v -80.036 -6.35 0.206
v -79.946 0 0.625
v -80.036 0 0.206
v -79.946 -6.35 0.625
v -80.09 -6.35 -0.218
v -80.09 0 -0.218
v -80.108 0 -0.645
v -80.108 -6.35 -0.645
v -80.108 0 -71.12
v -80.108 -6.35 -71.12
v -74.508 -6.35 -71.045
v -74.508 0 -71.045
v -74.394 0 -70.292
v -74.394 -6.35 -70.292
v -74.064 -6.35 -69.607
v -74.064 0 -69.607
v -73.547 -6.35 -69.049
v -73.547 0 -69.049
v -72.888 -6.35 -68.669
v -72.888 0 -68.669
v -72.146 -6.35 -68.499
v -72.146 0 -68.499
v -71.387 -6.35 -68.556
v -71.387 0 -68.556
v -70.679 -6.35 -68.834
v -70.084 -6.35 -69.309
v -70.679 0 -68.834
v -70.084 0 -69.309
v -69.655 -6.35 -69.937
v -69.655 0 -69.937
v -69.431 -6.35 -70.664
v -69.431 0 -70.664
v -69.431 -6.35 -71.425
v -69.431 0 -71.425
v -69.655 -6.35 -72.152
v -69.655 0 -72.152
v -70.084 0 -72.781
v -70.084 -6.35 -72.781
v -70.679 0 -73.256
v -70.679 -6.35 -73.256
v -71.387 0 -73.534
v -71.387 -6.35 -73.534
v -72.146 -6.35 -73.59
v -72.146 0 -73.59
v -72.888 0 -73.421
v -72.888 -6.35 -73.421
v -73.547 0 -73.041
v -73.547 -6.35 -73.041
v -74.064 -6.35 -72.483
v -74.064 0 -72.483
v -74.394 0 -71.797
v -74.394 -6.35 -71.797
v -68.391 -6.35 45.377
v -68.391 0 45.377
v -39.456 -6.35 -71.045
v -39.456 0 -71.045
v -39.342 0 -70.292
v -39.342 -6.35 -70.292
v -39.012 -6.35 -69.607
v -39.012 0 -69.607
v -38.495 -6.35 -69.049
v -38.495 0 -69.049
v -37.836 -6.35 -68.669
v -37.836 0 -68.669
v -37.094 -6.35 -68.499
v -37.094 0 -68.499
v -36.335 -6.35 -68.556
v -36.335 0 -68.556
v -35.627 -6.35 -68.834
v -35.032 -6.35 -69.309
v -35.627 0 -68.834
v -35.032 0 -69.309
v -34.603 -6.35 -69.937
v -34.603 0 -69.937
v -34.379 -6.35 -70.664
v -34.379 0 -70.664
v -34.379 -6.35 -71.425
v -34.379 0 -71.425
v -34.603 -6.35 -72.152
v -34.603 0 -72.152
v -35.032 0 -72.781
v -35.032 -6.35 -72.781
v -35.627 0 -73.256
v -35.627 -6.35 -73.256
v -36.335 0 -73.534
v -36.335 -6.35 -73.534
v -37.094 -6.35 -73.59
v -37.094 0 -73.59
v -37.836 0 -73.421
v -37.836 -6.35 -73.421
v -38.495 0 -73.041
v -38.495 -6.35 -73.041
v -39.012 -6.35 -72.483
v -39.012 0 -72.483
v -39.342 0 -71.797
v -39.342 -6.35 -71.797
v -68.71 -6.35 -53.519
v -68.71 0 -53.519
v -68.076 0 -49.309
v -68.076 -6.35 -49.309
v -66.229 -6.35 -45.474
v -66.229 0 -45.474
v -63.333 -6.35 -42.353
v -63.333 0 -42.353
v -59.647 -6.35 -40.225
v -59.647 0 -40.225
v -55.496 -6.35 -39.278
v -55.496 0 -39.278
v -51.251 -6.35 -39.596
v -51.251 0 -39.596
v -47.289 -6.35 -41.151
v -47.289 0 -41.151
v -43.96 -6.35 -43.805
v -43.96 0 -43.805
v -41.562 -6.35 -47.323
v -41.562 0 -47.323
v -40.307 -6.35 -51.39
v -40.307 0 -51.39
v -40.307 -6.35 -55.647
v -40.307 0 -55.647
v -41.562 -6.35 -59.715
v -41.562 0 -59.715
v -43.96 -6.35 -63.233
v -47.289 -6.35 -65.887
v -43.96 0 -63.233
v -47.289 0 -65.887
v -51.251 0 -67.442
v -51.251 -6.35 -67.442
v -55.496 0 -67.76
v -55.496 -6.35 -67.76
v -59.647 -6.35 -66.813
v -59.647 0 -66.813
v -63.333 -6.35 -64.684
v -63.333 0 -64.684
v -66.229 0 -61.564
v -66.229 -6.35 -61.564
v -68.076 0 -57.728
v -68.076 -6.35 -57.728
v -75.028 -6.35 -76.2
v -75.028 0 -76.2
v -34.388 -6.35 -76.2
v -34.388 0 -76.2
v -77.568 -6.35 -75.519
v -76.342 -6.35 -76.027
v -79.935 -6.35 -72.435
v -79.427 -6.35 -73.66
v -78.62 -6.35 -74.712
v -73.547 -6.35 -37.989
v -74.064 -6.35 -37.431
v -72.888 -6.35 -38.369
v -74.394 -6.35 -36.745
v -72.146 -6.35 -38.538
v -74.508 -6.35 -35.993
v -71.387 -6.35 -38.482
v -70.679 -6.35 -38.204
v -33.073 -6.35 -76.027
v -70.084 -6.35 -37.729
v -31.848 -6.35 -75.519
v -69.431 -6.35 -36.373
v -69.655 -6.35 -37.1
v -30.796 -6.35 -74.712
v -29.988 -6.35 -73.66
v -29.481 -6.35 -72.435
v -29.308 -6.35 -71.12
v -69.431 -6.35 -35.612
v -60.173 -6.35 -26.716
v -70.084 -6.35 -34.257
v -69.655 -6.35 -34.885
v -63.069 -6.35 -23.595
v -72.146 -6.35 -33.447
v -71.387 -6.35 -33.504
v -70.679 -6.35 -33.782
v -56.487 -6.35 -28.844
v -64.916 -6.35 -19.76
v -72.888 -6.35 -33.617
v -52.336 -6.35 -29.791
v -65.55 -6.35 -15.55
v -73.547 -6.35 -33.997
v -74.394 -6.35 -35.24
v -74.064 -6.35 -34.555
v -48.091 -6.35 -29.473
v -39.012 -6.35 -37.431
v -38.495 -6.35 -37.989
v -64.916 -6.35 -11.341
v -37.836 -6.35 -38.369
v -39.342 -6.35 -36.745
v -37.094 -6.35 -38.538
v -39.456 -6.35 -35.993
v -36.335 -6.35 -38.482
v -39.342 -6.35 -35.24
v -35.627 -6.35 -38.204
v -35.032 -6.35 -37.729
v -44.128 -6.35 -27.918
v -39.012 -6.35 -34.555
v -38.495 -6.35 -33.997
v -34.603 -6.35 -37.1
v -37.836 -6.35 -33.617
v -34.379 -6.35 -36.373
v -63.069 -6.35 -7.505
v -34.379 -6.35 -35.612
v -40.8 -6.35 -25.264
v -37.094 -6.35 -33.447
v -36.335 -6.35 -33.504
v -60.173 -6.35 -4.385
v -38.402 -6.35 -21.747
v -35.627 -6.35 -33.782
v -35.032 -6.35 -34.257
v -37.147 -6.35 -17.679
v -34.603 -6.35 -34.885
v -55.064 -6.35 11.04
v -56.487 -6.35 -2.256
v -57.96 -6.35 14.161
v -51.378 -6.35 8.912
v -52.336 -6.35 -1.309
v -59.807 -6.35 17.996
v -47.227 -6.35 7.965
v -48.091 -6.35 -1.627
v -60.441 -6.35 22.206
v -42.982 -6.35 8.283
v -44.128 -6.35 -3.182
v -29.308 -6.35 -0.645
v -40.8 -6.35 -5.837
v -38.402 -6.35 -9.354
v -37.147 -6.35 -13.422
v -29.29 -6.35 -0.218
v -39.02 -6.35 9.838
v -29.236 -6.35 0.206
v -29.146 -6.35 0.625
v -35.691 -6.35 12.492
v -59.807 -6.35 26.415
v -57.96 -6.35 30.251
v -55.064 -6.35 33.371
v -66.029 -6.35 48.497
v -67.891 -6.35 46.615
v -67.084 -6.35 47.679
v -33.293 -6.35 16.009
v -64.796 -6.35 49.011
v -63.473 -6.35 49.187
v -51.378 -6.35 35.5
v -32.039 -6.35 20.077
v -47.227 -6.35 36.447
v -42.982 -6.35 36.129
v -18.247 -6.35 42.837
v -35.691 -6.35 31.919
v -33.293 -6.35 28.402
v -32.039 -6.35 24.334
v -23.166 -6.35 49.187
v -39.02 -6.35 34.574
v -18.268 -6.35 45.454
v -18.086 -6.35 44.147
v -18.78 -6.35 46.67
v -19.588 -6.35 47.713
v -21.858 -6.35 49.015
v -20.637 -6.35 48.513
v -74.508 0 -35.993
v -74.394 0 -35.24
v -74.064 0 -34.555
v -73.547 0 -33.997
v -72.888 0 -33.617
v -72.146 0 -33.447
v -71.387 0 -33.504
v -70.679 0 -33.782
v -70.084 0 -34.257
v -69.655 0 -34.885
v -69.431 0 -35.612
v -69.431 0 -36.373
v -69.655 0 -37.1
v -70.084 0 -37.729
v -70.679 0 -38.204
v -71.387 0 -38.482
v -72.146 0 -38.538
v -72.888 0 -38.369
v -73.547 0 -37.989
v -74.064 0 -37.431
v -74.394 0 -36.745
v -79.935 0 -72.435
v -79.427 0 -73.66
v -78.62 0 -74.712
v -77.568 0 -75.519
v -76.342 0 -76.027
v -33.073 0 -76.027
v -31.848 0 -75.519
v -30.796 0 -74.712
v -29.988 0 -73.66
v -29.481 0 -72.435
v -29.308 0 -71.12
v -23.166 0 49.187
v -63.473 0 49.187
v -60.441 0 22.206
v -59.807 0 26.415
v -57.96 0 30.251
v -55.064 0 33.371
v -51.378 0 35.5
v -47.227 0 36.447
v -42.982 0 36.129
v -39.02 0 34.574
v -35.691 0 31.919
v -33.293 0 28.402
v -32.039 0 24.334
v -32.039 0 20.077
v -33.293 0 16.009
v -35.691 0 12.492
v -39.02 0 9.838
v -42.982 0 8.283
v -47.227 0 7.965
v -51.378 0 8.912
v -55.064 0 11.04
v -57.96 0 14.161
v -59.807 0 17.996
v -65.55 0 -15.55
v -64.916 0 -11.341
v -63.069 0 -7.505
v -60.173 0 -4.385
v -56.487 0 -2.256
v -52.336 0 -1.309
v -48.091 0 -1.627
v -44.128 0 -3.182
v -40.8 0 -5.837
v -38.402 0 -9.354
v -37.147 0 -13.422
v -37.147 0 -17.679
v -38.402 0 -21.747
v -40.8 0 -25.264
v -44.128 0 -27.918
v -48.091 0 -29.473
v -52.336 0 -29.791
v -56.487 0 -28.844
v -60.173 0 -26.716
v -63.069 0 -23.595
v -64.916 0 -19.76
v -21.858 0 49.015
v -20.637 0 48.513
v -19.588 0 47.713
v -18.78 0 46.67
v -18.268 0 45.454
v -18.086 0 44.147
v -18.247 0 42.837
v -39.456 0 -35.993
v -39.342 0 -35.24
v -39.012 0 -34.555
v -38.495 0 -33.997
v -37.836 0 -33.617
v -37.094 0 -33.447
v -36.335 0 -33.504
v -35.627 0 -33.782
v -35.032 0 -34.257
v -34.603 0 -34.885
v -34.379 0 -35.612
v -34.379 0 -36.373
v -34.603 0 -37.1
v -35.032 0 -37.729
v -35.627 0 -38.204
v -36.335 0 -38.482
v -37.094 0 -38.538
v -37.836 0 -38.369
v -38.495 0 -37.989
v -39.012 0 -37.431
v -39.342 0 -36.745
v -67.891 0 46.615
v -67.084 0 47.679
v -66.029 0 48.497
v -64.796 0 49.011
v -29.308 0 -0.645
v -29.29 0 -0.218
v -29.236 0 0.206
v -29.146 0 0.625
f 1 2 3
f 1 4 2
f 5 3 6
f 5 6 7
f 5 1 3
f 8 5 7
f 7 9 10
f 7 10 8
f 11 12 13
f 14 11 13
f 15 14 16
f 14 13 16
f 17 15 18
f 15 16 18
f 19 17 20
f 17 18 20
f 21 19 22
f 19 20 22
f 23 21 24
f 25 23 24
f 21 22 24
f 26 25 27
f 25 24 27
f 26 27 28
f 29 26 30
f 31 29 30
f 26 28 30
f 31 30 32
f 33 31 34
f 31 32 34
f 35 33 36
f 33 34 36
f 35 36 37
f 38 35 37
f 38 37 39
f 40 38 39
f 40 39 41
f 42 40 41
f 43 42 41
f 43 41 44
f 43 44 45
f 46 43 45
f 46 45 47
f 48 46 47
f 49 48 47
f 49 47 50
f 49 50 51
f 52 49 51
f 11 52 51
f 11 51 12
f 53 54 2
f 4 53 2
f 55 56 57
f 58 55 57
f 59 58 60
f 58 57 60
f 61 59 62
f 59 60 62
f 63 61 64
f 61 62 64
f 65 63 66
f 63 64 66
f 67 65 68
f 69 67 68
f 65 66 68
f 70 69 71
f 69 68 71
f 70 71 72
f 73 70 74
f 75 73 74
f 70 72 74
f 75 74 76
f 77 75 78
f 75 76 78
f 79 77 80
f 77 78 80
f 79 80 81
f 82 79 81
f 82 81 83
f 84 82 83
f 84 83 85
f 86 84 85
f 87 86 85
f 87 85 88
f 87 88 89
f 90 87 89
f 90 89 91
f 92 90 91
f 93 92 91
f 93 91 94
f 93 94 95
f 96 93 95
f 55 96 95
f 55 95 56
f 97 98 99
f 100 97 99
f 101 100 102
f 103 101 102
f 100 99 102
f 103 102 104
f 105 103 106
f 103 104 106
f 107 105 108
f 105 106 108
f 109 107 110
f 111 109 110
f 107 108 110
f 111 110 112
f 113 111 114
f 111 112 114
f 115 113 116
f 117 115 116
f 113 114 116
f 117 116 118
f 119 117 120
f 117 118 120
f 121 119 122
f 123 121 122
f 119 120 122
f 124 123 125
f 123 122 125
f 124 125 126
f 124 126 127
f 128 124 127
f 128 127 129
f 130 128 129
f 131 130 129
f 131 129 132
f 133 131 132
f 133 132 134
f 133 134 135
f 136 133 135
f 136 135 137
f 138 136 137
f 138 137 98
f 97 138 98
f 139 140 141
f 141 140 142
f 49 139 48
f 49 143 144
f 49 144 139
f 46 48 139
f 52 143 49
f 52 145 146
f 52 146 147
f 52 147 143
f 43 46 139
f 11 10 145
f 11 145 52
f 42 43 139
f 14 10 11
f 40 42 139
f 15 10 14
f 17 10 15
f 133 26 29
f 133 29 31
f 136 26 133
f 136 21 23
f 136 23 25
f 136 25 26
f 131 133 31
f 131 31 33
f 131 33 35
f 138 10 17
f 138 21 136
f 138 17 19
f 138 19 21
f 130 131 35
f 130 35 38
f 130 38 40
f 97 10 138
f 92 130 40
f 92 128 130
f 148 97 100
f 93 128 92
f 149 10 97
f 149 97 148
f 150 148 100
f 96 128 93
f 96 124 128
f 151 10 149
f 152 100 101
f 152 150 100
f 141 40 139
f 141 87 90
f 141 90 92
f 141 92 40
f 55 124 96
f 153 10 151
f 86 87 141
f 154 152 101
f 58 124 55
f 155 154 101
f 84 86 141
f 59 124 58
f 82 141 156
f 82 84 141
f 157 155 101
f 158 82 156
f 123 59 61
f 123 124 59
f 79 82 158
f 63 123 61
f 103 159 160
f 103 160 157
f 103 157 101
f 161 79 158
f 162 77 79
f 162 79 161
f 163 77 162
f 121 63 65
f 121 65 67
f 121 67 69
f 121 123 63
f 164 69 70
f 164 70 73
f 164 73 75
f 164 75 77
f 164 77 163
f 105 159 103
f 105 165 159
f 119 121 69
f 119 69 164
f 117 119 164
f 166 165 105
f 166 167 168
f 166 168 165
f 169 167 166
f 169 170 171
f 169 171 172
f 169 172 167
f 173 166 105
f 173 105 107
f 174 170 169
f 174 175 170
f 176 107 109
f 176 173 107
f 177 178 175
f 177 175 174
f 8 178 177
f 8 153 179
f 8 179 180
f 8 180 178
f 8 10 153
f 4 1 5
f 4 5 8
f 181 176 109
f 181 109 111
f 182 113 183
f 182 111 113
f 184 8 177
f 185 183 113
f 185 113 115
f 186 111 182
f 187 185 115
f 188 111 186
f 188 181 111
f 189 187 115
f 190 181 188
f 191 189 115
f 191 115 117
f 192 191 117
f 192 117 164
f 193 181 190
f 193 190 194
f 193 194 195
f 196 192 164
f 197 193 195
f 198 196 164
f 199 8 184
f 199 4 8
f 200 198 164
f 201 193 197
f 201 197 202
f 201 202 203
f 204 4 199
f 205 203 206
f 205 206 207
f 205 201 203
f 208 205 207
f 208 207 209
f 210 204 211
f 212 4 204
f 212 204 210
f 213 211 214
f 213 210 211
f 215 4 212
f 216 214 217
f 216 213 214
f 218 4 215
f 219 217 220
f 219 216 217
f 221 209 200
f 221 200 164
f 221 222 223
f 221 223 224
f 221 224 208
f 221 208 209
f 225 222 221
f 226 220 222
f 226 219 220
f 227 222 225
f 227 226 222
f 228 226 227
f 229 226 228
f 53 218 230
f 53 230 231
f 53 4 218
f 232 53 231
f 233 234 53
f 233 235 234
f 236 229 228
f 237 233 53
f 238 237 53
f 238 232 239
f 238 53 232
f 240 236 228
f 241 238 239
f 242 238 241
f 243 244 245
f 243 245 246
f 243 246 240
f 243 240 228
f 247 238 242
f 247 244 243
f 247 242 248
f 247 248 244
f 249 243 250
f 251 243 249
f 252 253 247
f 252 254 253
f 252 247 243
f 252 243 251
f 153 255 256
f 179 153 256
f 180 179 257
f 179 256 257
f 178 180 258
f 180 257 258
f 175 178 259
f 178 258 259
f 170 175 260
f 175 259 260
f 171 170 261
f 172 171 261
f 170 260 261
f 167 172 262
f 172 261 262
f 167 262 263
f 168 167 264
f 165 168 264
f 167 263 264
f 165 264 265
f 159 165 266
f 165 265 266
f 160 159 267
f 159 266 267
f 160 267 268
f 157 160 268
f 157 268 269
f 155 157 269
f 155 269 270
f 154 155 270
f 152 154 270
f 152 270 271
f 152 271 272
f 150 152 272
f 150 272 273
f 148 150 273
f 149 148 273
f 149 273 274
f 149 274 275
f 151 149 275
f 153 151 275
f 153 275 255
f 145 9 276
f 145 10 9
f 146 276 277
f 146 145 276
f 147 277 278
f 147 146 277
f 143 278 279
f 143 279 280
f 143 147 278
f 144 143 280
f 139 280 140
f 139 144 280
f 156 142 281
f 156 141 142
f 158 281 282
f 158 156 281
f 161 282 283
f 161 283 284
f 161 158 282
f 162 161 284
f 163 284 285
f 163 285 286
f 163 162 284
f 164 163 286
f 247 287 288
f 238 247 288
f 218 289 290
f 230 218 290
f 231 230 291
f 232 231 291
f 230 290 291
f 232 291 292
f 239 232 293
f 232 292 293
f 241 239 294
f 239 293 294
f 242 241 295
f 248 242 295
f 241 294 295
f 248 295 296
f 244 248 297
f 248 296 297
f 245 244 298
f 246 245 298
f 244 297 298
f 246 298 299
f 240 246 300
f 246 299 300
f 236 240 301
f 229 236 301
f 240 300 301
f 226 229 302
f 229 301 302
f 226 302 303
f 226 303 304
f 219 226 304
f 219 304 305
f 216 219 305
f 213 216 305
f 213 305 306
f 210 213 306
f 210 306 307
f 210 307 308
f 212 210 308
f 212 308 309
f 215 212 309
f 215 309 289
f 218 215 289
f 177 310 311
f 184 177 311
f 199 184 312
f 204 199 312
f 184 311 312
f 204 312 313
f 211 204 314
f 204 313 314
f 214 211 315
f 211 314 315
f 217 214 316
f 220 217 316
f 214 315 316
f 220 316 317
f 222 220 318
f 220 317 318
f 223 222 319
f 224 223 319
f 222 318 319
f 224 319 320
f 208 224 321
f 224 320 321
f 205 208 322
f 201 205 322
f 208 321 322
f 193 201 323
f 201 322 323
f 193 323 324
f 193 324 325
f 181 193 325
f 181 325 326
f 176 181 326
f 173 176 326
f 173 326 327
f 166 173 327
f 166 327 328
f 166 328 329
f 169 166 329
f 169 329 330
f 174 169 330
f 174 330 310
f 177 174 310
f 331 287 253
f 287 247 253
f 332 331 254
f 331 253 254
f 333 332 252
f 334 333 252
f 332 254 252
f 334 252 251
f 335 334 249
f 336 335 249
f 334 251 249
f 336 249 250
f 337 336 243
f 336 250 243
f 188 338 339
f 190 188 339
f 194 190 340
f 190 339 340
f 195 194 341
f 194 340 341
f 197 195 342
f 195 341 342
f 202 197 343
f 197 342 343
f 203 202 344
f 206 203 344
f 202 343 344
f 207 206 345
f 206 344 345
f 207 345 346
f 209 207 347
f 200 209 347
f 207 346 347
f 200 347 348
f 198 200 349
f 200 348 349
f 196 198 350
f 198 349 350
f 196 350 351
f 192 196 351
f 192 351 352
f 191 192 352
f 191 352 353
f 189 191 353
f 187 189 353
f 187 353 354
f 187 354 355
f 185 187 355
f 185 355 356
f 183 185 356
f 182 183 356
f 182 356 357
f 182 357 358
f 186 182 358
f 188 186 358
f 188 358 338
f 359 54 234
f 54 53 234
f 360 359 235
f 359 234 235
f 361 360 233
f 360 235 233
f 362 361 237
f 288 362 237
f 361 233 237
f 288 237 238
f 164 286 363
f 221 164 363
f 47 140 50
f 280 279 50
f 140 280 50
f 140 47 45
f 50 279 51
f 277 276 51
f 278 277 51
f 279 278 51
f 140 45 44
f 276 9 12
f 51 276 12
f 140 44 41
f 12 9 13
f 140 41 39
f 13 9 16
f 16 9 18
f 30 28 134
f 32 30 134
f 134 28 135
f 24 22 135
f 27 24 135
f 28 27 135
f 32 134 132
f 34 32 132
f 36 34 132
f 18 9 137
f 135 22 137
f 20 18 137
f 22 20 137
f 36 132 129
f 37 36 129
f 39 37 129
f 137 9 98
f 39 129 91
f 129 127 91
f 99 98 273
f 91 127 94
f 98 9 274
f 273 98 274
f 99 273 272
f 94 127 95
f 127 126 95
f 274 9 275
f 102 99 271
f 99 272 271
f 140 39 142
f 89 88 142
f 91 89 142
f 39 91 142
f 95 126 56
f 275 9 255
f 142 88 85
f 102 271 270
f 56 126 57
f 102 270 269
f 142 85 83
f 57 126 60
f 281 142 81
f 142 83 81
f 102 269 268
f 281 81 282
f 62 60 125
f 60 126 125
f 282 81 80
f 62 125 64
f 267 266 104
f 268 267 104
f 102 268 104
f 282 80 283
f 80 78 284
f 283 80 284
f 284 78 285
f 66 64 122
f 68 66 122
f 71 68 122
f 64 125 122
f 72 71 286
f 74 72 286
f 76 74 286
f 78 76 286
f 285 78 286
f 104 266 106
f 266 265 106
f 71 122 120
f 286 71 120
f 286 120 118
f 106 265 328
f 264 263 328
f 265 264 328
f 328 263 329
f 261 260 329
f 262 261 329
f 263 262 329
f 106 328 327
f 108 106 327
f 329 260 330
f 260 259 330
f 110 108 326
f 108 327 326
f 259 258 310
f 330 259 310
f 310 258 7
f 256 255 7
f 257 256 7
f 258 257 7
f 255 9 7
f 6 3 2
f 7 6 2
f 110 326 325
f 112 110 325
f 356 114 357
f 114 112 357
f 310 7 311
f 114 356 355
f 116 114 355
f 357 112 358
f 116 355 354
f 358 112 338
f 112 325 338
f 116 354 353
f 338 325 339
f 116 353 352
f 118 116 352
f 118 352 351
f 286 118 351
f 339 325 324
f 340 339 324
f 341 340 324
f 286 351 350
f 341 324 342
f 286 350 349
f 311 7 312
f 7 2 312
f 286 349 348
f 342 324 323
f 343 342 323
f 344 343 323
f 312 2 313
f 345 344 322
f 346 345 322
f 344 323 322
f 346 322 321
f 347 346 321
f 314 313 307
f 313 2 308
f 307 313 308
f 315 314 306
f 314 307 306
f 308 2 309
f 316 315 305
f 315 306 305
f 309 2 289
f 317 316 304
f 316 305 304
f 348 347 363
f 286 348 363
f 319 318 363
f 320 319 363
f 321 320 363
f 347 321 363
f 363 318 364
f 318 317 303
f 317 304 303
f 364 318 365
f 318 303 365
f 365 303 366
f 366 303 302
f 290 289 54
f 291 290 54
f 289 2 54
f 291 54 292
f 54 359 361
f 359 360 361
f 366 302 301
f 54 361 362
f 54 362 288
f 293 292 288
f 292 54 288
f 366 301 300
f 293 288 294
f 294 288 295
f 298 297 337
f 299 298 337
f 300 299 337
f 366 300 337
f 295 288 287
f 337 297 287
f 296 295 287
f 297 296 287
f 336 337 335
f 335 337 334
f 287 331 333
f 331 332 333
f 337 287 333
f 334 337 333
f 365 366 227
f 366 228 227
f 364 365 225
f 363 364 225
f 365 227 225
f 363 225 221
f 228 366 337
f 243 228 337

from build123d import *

# Parameters (mm, degrees)
F0_W     = 50.8
F0_H     = 76.2
F1_DEPTH = 6.35
F3_D     = 28.5623
F5_D     = 5.1054
F6_R     = 5.08


with BuildPart() as f1:
    # F0 (on Front) → F1 (new body)
    with BuildSketch(Plane.XZ):
        Polygon((-67.407699, 49.186888), (-80.107699, 0), (-29.307699, 0), (-16.607699, 49.186888), align=None)
        with Locations((-54.707699, -38.1)):
            Rectangle(F0_W, F0_H)
    extrude(amount=F1_DEPTH)

    # F3 (through all)
    with Locations(Plane.XZ.offset(6.35)):
        with Locations((-46.160249, 22.205738), (-51.269072, -15.550187), (-54.429126, -53.518912)):
            Hole(F3_D / 2)

    # F5 (through all)
    with Locations(Plane.XZ.offset(6.35)):
        with Locations((-36.903126, -35.992912), (-36.903126, -71.044912), (-71.955126, -71.044912), (-71.955126, -35.992912)):
            Hole(F5_D / 2)

    # F6
    f6_edges = [f1.edges().sort_by_distance(p)[0] for p in [
        (-67.407699, -3.175, 49.186888),
        (-16.607699, -3.175, 49.186888),
        (-80.107699, -3.175, 0),
        (-80.107699, -3.175, -76.2),
        (-29.307699, -3.175, -76.2),
        (-29.307699, -3.175, 0),
    ]]
    fillet(f6_edges, radius=F6_R)


solid = f1.part
